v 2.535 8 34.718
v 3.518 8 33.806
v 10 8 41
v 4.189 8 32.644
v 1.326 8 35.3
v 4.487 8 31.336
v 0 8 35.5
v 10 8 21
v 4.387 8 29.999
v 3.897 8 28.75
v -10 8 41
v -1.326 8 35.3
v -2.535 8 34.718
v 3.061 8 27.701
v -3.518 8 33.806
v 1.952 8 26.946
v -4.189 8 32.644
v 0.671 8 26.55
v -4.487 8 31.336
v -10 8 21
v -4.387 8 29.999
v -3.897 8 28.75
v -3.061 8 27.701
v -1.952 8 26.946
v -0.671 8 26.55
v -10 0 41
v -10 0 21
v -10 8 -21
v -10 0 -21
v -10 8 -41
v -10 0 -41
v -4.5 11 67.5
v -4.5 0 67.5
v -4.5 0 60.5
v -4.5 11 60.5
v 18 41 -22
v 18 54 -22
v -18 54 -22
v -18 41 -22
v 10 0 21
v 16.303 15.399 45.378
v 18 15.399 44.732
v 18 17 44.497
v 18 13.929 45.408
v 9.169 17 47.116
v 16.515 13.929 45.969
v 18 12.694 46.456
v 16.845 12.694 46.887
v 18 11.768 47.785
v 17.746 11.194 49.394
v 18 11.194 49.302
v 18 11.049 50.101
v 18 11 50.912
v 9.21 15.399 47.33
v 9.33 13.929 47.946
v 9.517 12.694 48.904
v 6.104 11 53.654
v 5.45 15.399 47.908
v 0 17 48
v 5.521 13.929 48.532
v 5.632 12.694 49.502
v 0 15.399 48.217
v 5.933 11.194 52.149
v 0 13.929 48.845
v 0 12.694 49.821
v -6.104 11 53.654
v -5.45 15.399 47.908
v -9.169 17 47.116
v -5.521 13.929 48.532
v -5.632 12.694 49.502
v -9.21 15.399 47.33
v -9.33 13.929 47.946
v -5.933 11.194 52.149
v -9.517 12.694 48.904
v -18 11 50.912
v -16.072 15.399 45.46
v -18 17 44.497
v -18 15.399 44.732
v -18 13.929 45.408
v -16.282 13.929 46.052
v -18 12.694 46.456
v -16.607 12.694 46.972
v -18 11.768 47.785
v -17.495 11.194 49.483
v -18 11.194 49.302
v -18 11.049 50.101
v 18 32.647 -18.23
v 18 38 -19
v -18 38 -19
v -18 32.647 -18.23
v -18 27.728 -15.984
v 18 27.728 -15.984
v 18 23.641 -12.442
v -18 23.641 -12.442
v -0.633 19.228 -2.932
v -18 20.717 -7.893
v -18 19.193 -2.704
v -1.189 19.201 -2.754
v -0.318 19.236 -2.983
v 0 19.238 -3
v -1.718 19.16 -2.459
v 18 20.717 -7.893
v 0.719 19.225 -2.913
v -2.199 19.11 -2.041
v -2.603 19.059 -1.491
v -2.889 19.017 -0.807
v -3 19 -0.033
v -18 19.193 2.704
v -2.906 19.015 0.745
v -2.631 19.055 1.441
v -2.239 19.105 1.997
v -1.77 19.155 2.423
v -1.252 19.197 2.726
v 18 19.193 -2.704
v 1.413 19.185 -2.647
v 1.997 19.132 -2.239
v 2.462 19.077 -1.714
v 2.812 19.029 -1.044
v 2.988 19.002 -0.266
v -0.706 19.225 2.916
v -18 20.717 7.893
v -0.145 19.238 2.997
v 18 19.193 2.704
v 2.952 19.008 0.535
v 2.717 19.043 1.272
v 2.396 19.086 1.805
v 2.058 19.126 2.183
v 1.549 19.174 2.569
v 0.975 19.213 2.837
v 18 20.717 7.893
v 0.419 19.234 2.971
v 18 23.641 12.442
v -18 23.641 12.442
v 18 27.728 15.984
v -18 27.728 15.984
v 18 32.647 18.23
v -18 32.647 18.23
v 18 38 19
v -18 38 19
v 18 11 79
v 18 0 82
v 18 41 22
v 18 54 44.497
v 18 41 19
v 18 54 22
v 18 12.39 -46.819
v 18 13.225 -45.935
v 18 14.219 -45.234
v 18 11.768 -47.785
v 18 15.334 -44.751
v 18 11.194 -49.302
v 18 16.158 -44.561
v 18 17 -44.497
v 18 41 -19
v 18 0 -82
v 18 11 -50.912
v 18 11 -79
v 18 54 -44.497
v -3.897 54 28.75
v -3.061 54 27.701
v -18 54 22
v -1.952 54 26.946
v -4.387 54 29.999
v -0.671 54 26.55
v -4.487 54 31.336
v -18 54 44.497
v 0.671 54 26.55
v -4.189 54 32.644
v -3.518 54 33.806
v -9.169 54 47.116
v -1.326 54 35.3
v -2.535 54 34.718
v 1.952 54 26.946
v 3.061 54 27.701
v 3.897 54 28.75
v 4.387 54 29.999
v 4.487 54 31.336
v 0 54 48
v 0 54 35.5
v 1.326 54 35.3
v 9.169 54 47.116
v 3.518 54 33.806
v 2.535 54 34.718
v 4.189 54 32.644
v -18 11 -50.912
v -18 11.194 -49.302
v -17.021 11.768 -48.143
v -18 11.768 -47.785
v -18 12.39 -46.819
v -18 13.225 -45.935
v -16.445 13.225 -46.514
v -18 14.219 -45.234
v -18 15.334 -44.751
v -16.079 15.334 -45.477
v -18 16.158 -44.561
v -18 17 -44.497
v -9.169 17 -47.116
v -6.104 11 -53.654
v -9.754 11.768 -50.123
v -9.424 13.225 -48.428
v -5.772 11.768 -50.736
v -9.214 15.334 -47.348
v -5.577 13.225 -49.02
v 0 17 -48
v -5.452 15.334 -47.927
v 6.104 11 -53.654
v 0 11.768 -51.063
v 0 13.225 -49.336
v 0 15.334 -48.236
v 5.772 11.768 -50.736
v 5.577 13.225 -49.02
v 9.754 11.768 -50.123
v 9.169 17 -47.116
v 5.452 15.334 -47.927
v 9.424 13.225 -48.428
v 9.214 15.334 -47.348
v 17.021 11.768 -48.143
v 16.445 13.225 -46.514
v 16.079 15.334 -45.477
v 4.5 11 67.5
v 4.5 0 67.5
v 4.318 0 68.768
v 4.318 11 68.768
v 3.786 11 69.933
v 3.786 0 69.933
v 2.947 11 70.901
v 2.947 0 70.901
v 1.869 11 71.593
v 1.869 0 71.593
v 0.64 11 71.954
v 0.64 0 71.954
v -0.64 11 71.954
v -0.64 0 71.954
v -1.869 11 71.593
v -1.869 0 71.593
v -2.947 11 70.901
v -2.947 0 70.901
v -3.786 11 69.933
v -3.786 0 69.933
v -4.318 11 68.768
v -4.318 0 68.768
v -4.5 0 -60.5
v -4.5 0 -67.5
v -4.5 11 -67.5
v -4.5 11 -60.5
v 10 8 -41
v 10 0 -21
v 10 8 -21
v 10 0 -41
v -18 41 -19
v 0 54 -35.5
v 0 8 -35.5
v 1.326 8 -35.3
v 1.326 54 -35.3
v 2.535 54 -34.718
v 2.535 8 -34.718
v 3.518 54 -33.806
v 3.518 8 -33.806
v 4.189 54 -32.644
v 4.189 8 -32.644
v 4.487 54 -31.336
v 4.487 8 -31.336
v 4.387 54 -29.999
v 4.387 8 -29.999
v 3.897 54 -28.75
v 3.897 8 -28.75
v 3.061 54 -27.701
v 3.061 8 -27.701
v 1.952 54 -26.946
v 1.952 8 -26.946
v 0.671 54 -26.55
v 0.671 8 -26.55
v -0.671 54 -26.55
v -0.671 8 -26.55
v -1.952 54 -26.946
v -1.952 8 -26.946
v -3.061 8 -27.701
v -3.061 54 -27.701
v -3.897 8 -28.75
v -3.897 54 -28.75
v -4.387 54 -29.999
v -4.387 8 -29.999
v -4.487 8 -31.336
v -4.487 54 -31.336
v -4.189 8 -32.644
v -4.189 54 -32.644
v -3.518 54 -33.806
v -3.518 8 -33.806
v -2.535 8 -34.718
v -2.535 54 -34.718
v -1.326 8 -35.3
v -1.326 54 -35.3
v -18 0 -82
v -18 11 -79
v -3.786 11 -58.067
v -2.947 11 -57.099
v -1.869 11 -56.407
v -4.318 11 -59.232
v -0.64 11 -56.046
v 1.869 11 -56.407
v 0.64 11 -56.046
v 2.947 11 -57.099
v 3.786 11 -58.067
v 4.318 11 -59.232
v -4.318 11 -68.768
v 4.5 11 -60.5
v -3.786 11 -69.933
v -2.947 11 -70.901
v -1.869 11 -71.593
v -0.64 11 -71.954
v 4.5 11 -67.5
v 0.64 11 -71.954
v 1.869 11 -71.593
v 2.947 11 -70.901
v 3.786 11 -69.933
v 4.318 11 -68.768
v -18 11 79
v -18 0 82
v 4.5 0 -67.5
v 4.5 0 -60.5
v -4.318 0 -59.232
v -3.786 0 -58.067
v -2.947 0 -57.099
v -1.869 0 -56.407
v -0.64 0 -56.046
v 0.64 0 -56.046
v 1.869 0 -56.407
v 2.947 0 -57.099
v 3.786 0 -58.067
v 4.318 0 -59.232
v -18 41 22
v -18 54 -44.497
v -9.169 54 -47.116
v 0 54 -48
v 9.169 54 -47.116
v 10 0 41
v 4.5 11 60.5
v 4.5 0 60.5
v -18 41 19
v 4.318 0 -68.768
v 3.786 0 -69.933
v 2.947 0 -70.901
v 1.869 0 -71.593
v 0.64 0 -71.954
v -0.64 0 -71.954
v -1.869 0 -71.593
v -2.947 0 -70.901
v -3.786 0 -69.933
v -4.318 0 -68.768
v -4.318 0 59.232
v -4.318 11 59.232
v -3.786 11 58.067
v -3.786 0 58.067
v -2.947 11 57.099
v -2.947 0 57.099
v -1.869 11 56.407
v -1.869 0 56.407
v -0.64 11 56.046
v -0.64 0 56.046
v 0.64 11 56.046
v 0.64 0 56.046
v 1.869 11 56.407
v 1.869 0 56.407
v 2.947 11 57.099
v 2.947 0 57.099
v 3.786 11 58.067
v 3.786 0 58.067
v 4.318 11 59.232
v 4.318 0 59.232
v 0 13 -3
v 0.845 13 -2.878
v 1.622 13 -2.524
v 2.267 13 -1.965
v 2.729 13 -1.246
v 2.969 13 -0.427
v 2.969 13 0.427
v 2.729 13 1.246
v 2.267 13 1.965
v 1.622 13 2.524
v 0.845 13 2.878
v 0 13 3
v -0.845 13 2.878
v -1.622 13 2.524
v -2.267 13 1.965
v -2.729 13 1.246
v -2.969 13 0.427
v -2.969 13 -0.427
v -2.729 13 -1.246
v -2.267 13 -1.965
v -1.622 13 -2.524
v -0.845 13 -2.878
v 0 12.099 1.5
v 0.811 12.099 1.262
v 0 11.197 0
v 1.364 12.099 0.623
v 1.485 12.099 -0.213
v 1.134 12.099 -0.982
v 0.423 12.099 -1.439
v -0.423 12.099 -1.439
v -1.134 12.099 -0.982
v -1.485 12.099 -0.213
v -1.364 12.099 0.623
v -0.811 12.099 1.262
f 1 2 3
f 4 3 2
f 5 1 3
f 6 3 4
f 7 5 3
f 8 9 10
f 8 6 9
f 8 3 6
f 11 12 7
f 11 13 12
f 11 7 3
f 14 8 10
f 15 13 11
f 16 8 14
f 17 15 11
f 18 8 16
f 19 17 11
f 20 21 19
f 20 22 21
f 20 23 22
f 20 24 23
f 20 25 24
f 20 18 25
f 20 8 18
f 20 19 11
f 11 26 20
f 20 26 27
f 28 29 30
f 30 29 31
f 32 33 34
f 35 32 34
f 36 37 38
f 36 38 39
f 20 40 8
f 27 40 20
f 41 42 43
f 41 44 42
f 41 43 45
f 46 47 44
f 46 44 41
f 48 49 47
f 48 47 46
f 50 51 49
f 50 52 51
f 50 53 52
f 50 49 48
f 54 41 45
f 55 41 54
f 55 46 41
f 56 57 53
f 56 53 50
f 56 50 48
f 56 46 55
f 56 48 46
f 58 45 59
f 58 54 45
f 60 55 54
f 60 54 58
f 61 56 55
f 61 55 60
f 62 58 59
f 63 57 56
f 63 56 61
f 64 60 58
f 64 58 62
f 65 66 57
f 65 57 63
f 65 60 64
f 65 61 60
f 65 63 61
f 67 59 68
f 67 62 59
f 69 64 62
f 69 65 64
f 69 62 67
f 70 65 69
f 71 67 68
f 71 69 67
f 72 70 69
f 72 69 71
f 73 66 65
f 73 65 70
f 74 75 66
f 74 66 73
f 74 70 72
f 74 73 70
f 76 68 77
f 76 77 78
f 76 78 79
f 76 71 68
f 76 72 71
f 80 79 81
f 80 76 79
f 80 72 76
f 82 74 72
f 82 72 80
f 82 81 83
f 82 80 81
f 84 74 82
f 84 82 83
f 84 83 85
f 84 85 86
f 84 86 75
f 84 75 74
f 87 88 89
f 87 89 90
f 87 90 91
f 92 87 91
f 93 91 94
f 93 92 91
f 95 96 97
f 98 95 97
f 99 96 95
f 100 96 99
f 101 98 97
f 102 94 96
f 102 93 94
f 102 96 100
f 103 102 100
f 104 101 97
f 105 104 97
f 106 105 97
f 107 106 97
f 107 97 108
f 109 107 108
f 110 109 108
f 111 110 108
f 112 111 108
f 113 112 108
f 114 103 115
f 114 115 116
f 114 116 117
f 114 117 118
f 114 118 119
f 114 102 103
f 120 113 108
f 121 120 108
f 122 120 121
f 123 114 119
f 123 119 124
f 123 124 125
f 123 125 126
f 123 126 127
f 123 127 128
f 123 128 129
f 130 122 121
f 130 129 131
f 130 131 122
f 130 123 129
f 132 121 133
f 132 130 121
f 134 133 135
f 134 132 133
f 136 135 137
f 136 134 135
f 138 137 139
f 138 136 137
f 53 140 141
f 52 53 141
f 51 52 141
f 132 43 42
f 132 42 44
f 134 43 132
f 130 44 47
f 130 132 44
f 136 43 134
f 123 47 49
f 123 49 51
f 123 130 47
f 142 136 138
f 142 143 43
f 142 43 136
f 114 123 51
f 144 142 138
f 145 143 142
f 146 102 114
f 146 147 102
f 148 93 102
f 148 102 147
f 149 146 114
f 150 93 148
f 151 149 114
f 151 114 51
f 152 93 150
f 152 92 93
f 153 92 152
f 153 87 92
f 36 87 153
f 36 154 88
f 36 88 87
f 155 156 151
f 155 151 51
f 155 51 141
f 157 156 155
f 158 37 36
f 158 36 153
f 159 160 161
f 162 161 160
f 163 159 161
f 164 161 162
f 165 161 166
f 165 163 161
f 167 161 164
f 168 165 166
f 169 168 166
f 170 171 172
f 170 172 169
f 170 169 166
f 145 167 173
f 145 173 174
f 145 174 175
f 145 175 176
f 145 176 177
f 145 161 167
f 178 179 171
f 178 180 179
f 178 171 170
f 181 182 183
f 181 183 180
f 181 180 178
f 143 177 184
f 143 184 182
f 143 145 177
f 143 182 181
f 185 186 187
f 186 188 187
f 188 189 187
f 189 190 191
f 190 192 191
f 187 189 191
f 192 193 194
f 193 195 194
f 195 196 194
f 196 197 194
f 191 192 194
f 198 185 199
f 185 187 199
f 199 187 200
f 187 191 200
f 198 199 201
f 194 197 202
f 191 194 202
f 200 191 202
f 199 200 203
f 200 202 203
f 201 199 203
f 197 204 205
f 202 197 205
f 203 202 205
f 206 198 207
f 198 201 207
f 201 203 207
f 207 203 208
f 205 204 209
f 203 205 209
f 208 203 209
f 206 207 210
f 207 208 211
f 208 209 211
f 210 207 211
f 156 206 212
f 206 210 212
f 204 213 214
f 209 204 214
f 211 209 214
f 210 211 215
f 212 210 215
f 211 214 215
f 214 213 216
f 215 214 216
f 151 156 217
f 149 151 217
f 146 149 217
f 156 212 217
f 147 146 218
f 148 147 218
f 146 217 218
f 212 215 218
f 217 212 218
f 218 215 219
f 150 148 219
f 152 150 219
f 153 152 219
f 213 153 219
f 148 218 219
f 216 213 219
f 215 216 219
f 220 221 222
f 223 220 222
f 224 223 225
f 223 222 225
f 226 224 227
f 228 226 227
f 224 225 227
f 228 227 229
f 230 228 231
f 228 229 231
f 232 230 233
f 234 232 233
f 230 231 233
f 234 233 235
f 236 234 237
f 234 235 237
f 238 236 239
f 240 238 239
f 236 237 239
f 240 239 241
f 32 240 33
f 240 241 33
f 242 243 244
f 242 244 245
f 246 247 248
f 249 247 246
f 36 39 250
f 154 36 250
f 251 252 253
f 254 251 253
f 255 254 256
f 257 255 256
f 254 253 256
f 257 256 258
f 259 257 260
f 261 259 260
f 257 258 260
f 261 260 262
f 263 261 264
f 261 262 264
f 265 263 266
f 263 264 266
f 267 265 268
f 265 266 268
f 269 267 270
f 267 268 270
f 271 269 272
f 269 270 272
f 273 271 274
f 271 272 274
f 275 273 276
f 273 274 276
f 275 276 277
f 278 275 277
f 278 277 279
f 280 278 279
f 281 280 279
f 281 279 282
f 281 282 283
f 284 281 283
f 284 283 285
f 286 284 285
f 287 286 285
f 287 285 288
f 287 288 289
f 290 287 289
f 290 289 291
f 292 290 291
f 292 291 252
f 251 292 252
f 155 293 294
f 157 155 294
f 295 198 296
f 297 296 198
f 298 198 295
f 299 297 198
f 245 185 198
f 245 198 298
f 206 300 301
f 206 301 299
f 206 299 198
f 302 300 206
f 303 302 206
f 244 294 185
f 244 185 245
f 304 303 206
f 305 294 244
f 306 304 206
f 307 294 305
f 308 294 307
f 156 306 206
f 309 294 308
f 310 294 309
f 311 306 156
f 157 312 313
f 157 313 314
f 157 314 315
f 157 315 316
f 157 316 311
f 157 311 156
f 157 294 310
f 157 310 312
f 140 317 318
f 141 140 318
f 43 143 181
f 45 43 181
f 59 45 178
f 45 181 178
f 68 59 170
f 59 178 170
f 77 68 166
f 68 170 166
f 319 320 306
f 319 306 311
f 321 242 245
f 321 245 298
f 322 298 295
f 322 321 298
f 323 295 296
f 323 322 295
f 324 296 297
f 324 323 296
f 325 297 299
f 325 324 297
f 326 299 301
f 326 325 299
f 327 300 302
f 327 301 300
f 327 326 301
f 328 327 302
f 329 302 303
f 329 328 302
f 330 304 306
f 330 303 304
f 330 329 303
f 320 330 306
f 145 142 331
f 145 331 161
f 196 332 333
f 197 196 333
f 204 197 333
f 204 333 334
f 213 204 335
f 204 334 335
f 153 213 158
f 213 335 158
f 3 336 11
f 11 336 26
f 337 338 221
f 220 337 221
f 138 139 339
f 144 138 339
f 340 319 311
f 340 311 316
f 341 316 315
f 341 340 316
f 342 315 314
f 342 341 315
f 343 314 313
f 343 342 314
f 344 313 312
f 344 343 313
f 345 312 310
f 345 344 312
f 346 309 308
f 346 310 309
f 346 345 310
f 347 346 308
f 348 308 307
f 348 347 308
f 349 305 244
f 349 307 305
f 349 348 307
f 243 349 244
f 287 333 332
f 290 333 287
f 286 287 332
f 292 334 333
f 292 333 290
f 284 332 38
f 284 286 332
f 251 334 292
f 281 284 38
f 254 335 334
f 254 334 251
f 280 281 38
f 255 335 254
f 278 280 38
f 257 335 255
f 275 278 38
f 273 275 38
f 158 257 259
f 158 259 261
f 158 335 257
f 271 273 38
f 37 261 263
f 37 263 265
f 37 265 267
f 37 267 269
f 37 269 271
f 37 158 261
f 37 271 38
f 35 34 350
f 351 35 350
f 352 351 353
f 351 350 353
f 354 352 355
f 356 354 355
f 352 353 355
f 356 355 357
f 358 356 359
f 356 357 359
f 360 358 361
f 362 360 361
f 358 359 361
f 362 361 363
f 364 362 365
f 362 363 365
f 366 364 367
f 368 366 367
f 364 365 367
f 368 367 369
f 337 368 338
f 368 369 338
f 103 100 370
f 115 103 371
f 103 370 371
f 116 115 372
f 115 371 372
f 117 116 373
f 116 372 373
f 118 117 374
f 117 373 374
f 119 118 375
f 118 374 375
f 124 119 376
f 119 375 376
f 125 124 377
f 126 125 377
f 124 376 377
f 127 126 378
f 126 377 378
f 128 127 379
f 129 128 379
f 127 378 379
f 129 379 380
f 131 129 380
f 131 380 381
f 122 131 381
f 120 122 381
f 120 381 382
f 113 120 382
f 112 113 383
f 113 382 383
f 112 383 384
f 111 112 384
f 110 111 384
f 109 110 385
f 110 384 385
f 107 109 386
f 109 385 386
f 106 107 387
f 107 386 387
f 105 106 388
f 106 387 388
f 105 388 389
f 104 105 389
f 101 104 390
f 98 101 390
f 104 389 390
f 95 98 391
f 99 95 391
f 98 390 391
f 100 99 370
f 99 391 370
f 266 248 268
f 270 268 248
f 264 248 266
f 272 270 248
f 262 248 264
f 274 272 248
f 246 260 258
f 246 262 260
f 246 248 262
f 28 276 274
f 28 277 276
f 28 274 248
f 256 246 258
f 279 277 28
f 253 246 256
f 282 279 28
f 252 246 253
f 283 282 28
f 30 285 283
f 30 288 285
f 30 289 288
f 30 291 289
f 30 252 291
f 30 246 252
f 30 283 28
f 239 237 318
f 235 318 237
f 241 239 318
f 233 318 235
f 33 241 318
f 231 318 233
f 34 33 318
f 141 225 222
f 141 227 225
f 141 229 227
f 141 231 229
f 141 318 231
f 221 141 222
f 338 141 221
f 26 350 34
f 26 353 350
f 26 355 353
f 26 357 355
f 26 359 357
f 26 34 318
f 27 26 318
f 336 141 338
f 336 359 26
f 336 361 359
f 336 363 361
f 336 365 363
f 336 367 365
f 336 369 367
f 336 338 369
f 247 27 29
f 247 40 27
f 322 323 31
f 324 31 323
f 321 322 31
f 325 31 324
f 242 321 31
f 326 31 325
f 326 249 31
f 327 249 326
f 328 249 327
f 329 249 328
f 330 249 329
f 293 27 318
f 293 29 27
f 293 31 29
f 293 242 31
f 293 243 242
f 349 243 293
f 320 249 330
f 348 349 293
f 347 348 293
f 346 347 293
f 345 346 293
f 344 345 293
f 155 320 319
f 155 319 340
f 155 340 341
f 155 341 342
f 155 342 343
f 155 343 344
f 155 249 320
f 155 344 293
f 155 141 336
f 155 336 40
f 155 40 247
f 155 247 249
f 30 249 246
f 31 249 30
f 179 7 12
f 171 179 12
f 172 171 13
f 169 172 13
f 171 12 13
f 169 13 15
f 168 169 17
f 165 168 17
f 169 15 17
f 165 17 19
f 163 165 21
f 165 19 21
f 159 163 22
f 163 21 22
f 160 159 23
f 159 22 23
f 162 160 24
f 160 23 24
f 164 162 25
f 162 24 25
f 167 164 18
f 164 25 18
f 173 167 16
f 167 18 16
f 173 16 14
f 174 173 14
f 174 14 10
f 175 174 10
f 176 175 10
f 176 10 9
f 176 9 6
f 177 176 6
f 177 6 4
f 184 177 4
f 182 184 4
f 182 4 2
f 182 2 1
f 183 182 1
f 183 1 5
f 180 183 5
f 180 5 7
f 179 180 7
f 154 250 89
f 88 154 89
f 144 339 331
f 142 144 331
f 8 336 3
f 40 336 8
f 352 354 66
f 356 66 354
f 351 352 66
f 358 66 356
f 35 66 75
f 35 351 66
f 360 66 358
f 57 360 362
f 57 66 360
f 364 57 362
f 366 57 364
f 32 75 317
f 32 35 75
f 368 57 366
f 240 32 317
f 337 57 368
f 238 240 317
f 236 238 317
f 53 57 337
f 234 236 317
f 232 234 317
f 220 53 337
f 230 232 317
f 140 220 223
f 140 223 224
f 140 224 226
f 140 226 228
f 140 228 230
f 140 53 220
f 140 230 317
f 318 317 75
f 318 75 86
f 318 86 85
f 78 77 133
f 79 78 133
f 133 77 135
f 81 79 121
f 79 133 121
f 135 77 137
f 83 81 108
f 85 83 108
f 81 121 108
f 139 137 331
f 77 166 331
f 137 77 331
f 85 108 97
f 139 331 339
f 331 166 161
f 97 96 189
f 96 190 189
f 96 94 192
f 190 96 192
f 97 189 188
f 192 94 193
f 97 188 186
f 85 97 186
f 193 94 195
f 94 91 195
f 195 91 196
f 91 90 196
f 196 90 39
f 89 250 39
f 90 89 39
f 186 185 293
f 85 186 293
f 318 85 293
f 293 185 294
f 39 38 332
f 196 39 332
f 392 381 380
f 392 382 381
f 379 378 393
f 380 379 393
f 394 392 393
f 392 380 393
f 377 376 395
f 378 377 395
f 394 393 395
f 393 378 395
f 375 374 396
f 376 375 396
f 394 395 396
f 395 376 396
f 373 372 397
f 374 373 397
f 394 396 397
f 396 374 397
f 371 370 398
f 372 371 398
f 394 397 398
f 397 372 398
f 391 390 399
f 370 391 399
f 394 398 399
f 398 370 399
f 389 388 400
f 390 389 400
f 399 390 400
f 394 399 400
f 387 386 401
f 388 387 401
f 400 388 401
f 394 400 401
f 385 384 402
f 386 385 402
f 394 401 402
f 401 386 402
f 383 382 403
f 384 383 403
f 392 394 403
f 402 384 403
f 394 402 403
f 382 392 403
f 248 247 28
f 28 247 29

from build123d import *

# Parameters (mm, degrees)
BOSS_EXTRUDE1_DEPTH       = 18
CUT_EXTRUDE1_DEPTH        = 43
SKETCH3_W                 = 20
SKETCH3_H                 = 20
CUT_EXTRUDE4_DEPTH        = 8
SKETCH5_R                 = 4.5
CUT_EXTRUDE5_DEPTH        = 47
CUT_EXTRUDE6_DEPTH        = 55
F_6_0MM_DOWEL_HOLE1_D     = 6
F_6_0MM_DOWEL_HOLE1_DEPTH = 6
F_6_0MM_DOWEL_HOLE1_TIP   = 1.802581857
FILLET1_R                 = 6
FILLET2_R                 = 6


with BuildPart() as part:
    # Sketch1 → Boss-Extrude1 (new body, symmetric)
    with BuildSketch(Plane(origin=(0, 0, 0), x_dir=(0, 0, -1), z_dir=(1, 0, 0))):
        with BuildLine():
            Line((-82, 0), (82, 0))
            Line((82, 0), (79, 11))
            Line((79, 11), (50, 11))
            Line((50, 11), (50, 54))
            Line((50, 54), (22, 54))
            Line((22, 54), (22, 41))
            Line((22, 41), (19, 41))
            Line((19, 41), (19, 38))
            ThreePointArc((19, 38), (0, 19), (-19, 38))
            Line((-19, 38), (-19, 41))
            Line((-19, 41), (-22, 41))
            Line((-22, 41), (-22, 54))
            Line((-22, 54), (-50, 54))
            Line((-50, 54), (-50, 11))
            Line((-50, 11), (-79, 11))
            Line((-79, 11), (-82, 0))
        make_face()
    extrude(amount=BOSS_EXTRUDE1_DEPTH, both=True)

    # Sketch2 → Cut-Extrude1 (cut)
    with BuildSketch(Plane(origin=(0, 54, 0), x_dir=(1, 0, 0), z_dir=(0, 1, 0))):
        with BuildLine():
            Line((-18, 50), (-18, 44.497190923))
            ThreePointArc((-18, 44.497190923), (0, 48), (18, 44.497190923))
            Line((18, 44.497190923), (18, 50))
            Line((18, 50), (-18, 50))
        make_face()
        with BuildLine():
            Line((18, -50), (18, -44.497190923))
            ThreePointArc((18, -44.497190923), (0, -48), (-18, -44.497190923))
            Line((-18, -44.497190923), (-18, -50))
            Line((-18, -50), (18, -50))
        make_face()
    extrude(amount=-CUT_EXTRUDE1_DEPTH, mode=Mode.SUBTRACT)

    # Sketch3 → Cut-Extrude4 (cut)
    with BuildSketch(Plane(origin=(0, 0, 0), x_dir=(-1, 0, 0), z_dir=(0, -1, 0))):
        with Locations((0, 31)):
            Rectangle(SKETCH3_W, SKETCH3_H)
        with Locations((0, -31)):
            Rectangle(SKETCH3_W, SKETCH3_H)
    extrude(amount=-CUT_EXTRUDE4_DEPTH, mode=Mode.SUBTRACT)

    # Sketch5 → Cut-Extrude5 (cut, through all)
    with BuildSketch(Plane(origin=(0, 8, 0), x_dir=(-1, 0, 0), z_dir=(0, -1, 0))):
        with Locations(Location((0, 31, 0), (0, 0, 90))):  # turned: the seam where the file's is
            Circle(SKETCH5_R)
        with Locations(Location((0, -31, 0), (0, 0, 270))):  # turned: the seam where the file's is
            Circle(SKETCH5_R)
    extrude(amount=-CUT_EXTRUDE5_DEPTH, mode=Mode.SUBTRACT)

    # Sketch6 → Cut-Extrude6 (cut, through all)
    with BuildSketch(Plane(origin=(0, 0, 0), x_dir=(-1, 0, 0), z_dir=(0, -1, 0))):
        with BuildLine():
            Line((-4.5, 60.5), (-4.5, 67.5))
            ThreePointArc((-4.5, 67.5), (0, 72), (4.5, 67.5))
            Line((4.5, 67.5), (4.5, 60.5))
            ThreePointArc((4.5, 60.5), (0, 56), (-4.5, 60.5))
        make_face()
        with BuildLine():
            Line((-4.5, -60.5), (-4.5, -67.5))
            ThreePointArc((-4.5, -67.5), (0, -72), (4.5, -67.5))
            Line((4.5, -67.5), (4.5, -60.5))
            ThreePointArc((4.5, -60.5), (0, -56), (-4.5, -60.5))
        make_face()
    extrude(amount=-CUT_EXTRUDE6_DEPTH, mode=Mode.SUBTRACT)

    # Ø6.0mm Dowel Hole1
    with Locations(Plane.ZX.offset(19)):
        with Locations((0, 0)):
            Hole(F_6_0MM_DOWEL_HOLE1_D / 2, depth=F_6_0MM_DOWEL_HOLE1_DEPTH)
            with Locations((0, 0, -(F_6_0MM_DOWEL_HOLE1_DEPTH + F_6_0MM_DOWEL_HOLE1_TIP / 2))):  # 118° drill point
                Cone(0, F_6_0MM_DOWEL_HOLE1_D / 2, F_6_0MM_DOWEL_HOLE1_TIP, mode=Mode.SUBTRACT)

    # Fillet1
    fillet1_edges = [part.edges().sort_by_distance(p)[0] for p in [
        (0, 11, 48),
    ]]
    fillet(fillet1_edges, radius=FILLET1_R)

    # Fillet2
    fillet2_edges = [part.edges().sort_by_distance(p)[0] for p in [
        (0, 11, -48),
    ]]
    fillet(fillet2_edges, radius=FILLET2_R)


solid = part.part
